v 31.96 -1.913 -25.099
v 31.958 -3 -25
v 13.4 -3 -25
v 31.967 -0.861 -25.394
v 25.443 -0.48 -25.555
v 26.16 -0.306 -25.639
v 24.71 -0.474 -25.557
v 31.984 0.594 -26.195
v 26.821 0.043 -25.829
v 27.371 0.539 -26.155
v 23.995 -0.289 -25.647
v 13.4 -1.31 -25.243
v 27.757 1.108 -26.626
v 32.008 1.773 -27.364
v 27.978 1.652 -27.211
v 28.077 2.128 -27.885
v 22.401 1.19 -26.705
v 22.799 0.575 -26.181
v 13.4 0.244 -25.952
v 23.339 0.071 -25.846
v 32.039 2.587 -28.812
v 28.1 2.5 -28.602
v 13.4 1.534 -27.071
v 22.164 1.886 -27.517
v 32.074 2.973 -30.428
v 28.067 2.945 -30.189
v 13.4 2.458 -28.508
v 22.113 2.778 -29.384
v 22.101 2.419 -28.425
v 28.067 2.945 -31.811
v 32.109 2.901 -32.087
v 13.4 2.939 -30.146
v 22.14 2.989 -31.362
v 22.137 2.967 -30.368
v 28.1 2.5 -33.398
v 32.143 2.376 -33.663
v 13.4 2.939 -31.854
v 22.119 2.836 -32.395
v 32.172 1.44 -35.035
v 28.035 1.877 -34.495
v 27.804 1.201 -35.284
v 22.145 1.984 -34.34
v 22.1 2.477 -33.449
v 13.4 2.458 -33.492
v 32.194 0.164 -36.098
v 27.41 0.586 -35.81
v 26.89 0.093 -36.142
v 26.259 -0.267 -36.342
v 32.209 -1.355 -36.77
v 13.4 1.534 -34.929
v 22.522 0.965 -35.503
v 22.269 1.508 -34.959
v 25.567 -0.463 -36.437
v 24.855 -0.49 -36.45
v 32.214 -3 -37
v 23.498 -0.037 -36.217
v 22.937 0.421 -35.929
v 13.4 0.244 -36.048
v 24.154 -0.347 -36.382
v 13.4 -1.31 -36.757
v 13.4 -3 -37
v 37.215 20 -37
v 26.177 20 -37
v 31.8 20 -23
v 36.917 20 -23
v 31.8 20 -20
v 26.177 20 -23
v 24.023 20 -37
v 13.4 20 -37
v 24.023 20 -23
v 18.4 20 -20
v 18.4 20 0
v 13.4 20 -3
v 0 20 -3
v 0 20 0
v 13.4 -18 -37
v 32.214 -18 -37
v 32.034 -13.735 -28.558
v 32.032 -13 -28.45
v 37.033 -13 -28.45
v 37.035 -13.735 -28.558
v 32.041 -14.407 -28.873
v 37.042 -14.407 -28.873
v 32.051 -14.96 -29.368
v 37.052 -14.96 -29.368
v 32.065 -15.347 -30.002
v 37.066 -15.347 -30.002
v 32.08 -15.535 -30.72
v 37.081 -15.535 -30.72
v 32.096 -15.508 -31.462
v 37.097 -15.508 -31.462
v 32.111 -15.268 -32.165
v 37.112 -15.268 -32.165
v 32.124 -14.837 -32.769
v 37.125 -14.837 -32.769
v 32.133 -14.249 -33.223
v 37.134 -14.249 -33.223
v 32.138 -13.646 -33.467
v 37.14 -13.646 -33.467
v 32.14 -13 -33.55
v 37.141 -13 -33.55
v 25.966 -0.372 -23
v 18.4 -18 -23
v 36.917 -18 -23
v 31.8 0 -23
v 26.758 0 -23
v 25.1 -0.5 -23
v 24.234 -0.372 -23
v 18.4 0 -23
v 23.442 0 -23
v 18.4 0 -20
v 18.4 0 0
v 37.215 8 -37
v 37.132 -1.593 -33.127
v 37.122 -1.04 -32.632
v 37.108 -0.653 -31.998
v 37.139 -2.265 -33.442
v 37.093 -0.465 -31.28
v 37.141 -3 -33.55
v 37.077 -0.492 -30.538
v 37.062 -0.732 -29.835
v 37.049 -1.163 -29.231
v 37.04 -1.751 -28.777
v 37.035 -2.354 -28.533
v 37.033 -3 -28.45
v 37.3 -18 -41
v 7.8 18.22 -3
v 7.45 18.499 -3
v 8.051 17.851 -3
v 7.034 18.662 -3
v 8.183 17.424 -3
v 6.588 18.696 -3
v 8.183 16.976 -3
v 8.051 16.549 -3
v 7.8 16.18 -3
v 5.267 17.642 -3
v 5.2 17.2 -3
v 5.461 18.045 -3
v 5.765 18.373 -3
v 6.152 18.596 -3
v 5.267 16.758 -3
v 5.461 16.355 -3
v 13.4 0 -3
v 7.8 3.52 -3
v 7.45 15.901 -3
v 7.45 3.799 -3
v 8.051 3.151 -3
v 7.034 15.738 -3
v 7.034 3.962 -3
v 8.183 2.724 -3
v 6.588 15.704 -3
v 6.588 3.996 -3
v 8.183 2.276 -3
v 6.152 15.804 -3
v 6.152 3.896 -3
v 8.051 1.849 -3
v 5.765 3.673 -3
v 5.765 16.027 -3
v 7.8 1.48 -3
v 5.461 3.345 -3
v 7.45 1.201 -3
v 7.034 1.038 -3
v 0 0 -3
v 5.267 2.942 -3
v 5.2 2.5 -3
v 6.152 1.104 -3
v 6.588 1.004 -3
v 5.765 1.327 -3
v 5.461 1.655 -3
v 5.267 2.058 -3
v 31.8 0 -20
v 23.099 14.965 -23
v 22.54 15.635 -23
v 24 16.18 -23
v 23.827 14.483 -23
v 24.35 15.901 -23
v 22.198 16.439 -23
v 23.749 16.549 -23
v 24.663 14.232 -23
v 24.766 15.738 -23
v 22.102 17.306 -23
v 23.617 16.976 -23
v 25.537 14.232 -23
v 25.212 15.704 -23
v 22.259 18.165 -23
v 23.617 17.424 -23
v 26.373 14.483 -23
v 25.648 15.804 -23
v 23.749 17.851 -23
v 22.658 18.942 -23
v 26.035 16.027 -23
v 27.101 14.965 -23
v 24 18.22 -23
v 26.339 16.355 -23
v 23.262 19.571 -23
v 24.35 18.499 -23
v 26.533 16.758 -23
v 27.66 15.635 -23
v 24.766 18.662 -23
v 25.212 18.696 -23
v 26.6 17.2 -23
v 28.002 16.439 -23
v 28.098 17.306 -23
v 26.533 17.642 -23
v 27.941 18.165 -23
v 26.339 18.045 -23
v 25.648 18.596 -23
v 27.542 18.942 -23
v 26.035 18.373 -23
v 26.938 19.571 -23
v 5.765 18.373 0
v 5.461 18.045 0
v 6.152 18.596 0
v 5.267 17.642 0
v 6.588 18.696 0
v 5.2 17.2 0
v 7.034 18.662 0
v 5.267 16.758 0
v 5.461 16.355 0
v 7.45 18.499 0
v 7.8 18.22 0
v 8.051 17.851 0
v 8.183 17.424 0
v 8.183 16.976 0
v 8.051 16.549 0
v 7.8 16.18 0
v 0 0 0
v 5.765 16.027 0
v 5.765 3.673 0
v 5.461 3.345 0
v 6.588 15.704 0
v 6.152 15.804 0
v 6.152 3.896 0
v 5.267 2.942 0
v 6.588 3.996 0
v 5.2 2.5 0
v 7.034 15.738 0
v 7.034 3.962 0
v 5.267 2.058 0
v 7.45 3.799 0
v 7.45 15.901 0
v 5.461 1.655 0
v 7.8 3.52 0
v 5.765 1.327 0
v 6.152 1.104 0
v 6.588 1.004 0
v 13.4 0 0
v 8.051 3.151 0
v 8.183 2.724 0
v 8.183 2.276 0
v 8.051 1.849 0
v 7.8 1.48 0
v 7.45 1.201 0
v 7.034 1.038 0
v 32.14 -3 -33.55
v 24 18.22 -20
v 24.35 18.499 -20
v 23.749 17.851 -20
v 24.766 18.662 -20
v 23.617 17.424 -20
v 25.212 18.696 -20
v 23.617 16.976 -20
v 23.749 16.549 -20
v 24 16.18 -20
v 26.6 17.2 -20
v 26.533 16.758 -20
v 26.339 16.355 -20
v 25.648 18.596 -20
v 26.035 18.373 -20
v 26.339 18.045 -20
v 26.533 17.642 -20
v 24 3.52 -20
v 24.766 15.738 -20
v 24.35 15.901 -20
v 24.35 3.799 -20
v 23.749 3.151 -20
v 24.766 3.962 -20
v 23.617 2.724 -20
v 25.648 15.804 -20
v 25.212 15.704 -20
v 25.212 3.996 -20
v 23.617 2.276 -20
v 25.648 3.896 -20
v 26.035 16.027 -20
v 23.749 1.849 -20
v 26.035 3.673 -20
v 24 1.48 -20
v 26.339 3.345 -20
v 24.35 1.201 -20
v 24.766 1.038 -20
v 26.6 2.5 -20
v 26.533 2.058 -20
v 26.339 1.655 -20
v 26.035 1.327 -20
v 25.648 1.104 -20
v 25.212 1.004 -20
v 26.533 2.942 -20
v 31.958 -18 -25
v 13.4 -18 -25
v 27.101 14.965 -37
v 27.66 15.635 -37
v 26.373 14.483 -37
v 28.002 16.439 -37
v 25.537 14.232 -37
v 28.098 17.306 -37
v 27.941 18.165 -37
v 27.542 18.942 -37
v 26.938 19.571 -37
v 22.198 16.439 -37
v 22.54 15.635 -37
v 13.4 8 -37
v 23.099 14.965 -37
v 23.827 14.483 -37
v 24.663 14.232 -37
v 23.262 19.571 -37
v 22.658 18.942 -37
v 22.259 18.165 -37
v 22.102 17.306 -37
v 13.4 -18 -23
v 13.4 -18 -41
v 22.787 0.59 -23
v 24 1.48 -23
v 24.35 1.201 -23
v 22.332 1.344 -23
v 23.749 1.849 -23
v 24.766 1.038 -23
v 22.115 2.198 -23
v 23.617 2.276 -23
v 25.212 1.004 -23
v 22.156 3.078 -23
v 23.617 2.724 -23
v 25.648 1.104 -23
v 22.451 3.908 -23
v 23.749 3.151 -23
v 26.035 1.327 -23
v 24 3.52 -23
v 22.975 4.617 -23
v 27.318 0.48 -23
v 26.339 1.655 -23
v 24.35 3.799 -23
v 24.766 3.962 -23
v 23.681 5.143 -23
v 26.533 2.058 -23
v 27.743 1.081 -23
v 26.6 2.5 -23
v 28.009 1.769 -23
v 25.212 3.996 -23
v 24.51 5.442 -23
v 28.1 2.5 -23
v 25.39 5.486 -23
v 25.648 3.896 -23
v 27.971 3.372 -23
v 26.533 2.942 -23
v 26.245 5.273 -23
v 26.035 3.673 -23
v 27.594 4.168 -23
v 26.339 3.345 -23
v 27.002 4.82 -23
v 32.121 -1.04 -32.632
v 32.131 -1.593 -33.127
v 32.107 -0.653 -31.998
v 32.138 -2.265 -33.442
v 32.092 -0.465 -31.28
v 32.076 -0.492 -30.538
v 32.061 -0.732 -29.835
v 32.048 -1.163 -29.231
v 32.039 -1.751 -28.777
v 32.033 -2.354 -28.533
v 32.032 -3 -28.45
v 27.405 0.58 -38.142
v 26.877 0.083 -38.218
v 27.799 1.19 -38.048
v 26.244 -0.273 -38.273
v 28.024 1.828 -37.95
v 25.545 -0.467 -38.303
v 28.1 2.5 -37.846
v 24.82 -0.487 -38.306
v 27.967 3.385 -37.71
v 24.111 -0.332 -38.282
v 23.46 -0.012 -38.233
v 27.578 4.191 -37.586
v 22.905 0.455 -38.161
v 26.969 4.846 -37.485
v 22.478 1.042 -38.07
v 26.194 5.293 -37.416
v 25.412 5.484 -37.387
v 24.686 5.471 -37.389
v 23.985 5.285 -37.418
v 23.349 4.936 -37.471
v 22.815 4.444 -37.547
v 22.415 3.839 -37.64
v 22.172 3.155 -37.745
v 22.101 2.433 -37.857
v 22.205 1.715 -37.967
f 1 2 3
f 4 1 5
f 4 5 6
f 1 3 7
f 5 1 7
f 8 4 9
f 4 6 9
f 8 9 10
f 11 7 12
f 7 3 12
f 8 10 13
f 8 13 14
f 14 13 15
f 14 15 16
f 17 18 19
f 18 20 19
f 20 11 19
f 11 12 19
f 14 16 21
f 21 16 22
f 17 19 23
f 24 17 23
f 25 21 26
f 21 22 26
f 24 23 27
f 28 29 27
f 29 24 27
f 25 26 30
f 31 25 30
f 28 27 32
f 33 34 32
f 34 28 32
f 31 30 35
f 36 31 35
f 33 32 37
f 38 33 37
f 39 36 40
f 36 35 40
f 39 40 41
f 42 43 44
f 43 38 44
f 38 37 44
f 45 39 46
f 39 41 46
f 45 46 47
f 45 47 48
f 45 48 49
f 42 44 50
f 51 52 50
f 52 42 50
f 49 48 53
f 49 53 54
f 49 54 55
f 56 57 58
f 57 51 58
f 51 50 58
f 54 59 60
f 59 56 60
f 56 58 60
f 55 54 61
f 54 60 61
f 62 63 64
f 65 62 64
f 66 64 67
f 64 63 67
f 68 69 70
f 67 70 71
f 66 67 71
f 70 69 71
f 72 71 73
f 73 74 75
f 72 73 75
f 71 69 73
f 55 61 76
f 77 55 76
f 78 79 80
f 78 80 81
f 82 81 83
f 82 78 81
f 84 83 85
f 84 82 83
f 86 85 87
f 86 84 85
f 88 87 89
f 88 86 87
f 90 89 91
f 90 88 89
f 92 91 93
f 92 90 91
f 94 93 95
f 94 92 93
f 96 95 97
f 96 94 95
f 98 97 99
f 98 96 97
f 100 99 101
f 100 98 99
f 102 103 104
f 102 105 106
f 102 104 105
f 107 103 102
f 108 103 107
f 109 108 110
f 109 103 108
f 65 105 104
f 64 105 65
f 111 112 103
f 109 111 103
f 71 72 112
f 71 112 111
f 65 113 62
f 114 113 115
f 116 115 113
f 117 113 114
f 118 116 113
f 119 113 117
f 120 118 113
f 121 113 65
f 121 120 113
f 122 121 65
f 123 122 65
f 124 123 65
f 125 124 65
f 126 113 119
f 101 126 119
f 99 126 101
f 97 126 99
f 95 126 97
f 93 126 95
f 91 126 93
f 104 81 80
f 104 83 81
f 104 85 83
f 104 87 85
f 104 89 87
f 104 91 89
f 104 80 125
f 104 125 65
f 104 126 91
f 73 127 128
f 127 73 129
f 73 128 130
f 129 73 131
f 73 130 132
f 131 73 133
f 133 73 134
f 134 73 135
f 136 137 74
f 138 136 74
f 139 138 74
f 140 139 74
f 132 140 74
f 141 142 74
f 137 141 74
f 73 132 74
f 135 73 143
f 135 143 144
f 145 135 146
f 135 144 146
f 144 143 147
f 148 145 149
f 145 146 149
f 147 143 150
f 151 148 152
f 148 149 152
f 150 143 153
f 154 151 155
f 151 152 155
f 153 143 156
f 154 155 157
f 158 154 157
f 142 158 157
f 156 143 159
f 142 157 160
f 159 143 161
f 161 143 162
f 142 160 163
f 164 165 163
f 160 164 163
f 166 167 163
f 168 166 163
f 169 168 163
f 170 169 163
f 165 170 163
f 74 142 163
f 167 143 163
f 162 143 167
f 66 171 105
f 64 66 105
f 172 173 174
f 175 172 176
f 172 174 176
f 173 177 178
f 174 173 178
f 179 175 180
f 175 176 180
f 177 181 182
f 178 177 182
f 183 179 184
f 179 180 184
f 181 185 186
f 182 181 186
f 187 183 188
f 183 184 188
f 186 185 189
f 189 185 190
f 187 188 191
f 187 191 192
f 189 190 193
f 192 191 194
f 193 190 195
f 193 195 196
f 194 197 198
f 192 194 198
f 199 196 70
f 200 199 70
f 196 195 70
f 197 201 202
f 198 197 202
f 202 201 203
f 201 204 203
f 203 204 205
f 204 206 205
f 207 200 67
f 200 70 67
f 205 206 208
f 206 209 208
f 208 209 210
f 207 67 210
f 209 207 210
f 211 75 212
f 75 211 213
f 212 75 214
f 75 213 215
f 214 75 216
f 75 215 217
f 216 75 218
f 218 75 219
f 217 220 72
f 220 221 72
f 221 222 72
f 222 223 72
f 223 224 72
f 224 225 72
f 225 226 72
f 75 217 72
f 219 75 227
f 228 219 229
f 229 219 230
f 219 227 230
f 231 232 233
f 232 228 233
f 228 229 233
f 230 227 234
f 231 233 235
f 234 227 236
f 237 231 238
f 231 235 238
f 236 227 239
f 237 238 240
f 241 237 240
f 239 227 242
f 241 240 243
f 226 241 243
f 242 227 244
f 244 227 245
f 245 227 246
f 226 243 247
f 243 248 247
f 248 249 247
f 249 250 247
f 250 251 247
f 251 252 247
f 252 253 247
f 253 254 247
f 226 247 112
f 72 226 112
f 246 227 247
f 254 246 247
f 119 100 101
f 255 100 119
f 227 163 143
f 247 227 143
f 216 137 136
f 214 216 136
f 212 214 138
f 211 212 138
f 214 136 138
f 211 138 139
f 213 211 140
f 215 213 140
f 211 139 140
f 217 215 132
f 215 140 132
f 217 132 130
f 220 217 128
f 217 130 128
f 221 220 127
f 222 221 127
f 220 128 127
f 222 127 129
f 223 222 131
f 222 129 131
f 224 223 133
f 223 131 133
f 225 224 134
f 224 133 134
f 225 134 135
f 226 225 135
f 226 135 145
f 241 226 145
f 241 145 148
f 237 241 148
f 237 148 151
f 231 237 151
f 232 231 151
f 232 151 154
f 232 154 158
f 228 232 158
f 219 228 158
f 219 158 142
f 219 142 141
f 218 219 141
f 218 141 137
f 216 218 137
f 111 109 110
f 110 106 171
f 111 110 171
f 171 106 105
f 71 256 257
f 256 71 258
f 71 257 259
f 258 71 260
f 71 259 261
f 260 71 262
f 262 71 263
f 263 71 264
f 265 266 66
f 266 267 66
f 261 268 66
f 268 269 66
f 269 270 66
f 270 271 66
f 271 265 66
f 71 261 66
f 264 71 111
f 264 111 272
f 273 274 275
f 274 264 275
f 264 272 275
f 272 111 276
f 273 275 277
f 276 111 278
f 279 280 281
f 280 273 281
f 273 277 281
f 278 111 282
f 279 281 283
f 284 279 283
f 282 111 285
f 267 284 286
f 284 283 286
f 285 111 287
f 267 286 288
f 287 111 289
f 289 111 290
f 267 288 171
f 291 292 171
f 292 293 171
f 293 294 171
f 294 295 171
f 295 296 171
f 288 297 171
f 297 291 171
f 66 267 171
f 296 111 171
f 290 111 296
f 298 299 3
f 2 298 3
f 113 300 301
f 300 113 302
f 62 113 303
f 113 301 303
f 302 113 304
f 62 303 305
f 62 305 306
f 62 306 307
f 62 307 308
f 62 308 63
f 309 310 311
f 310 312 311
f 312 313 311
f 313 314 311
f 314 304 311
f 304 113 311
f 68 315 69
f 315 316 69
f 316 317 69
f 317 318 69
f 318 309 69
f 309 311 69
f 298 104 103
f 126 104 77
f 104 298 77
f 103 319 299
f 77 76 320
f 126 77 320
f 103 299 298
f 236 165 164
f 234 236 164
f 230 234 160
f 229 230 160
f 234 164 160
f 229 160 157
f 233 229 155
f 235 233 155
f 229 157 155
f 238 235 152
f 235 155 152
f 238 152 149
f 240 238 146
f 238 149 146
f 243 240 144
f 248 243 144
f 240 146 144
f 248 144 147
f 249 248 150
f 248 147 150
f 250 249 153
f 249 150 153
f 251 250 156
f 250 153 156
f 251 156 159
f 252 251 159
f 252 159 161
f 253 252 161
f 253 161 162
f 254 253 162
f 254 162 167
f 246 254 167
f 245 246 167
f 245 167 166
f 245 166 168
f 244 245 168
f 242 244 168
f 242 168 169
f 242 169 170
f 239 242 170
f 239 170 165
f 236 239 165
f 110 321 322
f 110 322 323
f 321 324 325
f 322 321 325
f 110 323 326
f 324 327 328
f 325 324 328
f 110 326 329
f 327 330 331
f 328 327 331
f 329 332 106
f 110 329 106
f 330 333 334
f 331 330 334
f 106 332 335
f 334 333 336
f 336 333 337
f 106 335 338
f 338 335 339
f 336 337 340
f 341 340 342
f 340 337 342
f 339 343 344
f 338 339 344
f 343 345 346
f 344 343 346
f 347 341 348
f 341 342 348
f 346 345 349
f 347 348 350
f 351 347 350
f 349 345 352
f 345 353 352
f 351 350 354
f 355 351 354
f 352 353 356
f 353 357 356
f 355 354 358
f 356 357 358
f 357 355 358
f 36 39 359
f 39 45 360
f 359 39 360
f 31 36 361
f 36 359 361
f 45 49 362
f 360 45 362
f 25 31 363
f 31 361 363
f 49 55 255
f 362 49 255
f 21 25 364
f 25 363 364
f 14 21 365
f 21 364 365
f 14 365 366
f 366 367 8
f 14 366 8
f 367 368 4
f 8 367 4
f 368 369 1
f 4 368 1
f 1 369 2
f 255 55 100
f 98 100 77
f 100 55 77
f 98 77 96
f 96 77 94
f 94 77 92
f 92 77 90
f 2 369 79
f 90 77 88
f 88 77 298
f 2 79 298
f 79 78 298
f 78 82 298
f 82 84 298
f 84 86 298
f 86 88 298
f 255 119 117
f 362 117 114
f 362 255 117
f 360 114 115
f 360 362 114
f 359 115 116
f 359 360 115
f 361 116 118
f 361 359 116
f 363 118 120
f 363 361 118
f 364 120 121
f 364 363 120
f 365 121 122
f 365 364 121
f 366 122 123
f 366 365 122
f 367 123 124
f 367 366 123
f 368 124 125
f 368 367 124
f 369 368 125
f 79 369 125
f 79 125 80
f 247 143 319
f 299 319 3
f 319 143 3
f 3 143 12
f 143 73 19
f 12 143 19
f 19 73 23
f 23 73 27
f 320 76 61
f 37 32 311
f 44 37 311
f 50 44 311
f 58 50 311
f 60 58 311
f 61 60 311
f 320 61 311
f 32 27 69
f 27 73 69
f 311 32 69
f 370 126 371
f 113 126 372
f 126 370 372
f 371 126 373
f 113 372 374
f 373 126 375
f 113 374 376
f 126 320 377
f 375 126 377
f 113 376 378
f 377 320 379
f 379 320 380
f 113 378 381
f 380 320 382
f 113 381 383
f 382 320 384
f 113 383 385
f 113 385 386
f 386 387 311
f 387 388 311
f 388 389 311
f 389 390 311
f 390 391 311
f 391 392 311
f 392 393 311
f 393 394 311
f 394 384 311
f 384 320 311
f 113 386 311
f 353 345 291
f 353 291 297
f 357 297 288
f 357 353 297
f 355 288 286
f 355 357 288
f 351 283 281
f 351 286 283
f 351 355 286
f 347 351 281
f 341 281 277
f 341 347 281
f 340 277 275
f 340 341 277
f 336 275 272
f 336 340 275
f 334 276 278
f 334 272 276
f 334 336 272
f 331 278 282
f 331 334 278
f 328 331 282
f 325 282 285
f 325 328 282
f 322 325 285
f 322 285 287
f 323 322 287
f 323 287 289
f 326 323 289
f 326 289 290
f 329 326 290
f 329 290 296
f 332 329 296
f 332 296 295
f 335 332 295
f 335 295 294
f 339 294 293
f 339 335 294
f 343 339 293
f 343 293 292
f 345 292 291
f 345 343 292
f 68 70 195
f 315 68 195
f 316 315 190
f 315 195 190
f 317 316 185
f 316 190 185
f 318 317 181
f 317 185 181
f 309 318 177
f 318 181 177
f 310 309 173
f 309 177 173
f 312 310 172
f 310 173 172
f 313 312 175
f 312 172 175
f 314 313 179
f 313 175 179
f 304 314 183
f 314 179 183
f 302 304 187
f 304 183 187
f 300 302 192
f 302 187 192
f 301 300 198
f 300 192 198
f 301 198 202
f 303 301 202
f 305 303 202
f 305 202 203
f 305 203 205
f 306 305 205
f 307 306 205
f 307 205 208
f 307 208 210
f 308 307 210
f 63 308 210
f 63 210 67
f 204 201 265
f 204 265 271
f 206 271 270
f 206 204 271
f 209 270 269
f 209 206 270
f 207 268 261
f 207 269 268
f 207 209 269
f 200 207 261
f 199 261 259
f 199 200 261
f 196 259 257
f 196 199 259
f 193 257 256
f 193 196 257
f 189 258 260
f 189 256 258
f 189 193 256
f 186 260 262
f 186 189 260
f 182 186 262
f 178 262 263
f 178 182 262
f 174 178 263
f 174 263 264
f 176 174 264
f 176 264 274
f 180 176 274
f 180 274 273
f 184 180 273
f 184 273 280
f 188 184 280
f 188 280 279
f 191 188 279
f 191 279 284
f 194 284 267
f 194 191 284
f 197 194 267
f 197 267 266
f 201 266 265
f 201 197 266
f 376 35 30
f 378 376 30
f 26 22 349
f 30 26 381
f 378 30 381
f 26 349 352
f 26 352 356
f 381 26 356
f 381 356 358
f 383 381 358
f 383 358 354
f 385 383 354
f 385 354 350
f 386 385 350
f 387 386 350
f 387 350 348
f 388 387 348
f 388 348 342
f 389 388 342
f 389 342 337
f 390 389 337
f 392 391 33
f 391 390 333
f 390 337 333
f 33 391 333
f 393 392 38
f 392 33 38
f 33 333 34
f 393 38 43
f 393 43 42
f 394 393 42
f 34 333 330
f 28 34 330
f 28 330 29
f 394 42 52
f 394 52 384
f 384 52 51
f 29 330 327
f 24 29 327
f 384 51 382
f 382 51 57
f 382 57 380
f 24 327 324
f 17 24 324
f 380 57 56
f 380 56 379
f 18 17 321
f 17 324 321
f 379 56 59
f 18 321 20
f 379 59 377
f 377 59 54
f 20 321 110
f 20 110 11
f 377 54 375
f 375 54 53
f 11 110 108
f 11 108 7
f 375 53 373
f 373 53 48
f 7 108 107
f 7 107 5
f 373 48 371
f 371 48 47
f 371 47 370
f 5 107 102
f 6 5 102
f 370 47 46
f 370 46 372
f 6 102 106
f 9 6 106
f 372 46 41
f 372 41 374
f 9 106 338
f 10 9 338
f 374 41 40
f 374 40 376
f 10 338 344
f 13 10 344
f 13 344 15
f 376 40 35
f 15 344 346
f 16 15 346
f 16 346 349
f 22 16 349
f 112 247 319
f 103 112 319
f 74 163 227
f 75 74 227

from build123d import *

# Parameters (mm, degrees)
BOSS_EXTRUDE1_DEPTH              = 20
CUT_EXTRUDE1_START               = -4
SKETCH2_R                        = 1.5
CUT_EXTRUDE1_DEPTH               = 25
BOSS_EXTRUDE2_DEPTH              = 23.9
SKETCH4_R                        = 3
CUT_EXTRUDE2_DEPTH               = 19
BOSS_EXTRUDE3_DEPTH              = 5
CUT_EXTRUDE3_DEPTH               = 39
CUT_EXTRUDE4_REACH               = 30.9
CUT_EXTRUDE4_OFFSET_FROM_SURFACE = 5


with BuildPart() as part:
    # Sketch1 → Boss-Extrude1 (new body)
    with BuildSketch(Plane(origin=(0, 0, 0), x_dir=(1, 0, 0), z_dir=(0, 1, 0))):
        Polygon((0, 0), (18.4, 0), (18.4, 20), (31.8, 20), (31.8, 23), (13.4, 23), (13.4, 3), (0, 3), align=None)
    extrude(amount=BOSS_EXTRUDE1_DEPTH)

    # Sketch2 → Cut-Extrude1 (cut)
    with BuildSketch(Plane.XY.offset(-20).offset(CUT_EXTRUDE1_START)):
        with Locations((25.1, 2.5)):
            Circle(SKETCH2_R)
        with Locations((25.1, 17.2)):
            Circle(SKETCH2_R)
    cut_extrude1 = extrude(amount=CUT_EXTRUDE1_DEPTH, mode=Mode.SUBTRACT)

    # Mirror1: Cut-Extrude1 across plane
    add(cut_extrude1.mirror(Plane.ZY.offset(-15.9)), mode=Mode.SUBTRACT)

    # Sketch3 → Boss-Extrude2 (add)
    with BuildSketch(Plane.ZY.offset(-13.4)):
        Polygon((-23, 0), (-23, -18), (-41, -18), (-37, 8), (-37, 20), (-23, 20), align=None)
        with BuildLine():
            Line((-33.55, -13), (-33.55, -3))
            ThreePointArc((-33.55, -3), (-31, -0.45), (-28.45, -3))
            Line((-28.45, -3), (-28.45, -13))
            ThreePointArc((-28.45, -13), (-31, -15.55), (-33.55, -13))
        make_face(mode=Mode.SUBTRACT)
    extrude(amount=-BOSS_EXTRUDE2_DEPTH)

    # Sketch4 → Cut-Extrude2 (cut, through all)
    with BuildSketch(Plane.XY.offset(-23)):
        with Locations((25.1, 2.5)):
            Circle(SKETCH4_R)
        with Locations((25.1, 17.2)):
            Circle(SKETCH4_R)
    extrude(amount=-CUT_EXTRUDE2_DEPTH, mode=Mode.SUBTRACT)

    # Sketch5 → Boss-Extrude3 (add)
    with BuildSketch(Plane.ZY.offset(-13.4)):
        Polygon((0, 0), (-23, -18), (-23, 0), align=None)
    extrude(amount=-BOSS_EXTRUDE3_DEPTH)

    # Sketch8 → Cut-Extrude3 (cut, through all)
    with BuildSketch(Plane.XZ.offset(18)):
        Polygon((37.3, -41), (36.916667761, -23), (37.3, -23), align=None)
    extrude(amount=-CUT_EXTRUDE3_DEPTH, mode=Mode.SUBTRACT)

    # Cut-Extrude4: up to this face of the body (flat: up to its plane, moved by the offset)
    cut_extrude4_end = Plane(part.part.faces().sort_by_distance((37.080777775, 1.205864864, -30.706057437))[0]).offset(-CUT_EXTRUDE4_OFFSET_FROM_SURFACE)
    # Sketch9 → Cut-Extrude4 (cut, up to the picked face)
    with BuildSketch(Plane.ZY.offset(-13.4), mode=Mode.PRIVATE) as cut_extrude4_sk1:
        with BuildLine():
            Line((-37, -3), (-37, -18))
            Line((-37, -18), (-25, -18))
            Line((-25, -18), (-25, -3))
            ThreePointArc((-25, -3), (-31, 3), (-37, -3))
        make_face()
    cut_extrude4_tool1 = split(extrude(cut_extrude4_sk1.sketch, amount=-CUT_EXTRUDE4_REACH, mode=Mode.PRIVATE), bisect_by=cut_extrude4_end, keep=Keep.BOTH, mode=Mode.PRIVATE)
    add(cut_extrude4_tool1.solids().sort_by_distance((13.4, -8.098317, -31))[0], mode=Mode.SUBTRACT)


solid = part.part
